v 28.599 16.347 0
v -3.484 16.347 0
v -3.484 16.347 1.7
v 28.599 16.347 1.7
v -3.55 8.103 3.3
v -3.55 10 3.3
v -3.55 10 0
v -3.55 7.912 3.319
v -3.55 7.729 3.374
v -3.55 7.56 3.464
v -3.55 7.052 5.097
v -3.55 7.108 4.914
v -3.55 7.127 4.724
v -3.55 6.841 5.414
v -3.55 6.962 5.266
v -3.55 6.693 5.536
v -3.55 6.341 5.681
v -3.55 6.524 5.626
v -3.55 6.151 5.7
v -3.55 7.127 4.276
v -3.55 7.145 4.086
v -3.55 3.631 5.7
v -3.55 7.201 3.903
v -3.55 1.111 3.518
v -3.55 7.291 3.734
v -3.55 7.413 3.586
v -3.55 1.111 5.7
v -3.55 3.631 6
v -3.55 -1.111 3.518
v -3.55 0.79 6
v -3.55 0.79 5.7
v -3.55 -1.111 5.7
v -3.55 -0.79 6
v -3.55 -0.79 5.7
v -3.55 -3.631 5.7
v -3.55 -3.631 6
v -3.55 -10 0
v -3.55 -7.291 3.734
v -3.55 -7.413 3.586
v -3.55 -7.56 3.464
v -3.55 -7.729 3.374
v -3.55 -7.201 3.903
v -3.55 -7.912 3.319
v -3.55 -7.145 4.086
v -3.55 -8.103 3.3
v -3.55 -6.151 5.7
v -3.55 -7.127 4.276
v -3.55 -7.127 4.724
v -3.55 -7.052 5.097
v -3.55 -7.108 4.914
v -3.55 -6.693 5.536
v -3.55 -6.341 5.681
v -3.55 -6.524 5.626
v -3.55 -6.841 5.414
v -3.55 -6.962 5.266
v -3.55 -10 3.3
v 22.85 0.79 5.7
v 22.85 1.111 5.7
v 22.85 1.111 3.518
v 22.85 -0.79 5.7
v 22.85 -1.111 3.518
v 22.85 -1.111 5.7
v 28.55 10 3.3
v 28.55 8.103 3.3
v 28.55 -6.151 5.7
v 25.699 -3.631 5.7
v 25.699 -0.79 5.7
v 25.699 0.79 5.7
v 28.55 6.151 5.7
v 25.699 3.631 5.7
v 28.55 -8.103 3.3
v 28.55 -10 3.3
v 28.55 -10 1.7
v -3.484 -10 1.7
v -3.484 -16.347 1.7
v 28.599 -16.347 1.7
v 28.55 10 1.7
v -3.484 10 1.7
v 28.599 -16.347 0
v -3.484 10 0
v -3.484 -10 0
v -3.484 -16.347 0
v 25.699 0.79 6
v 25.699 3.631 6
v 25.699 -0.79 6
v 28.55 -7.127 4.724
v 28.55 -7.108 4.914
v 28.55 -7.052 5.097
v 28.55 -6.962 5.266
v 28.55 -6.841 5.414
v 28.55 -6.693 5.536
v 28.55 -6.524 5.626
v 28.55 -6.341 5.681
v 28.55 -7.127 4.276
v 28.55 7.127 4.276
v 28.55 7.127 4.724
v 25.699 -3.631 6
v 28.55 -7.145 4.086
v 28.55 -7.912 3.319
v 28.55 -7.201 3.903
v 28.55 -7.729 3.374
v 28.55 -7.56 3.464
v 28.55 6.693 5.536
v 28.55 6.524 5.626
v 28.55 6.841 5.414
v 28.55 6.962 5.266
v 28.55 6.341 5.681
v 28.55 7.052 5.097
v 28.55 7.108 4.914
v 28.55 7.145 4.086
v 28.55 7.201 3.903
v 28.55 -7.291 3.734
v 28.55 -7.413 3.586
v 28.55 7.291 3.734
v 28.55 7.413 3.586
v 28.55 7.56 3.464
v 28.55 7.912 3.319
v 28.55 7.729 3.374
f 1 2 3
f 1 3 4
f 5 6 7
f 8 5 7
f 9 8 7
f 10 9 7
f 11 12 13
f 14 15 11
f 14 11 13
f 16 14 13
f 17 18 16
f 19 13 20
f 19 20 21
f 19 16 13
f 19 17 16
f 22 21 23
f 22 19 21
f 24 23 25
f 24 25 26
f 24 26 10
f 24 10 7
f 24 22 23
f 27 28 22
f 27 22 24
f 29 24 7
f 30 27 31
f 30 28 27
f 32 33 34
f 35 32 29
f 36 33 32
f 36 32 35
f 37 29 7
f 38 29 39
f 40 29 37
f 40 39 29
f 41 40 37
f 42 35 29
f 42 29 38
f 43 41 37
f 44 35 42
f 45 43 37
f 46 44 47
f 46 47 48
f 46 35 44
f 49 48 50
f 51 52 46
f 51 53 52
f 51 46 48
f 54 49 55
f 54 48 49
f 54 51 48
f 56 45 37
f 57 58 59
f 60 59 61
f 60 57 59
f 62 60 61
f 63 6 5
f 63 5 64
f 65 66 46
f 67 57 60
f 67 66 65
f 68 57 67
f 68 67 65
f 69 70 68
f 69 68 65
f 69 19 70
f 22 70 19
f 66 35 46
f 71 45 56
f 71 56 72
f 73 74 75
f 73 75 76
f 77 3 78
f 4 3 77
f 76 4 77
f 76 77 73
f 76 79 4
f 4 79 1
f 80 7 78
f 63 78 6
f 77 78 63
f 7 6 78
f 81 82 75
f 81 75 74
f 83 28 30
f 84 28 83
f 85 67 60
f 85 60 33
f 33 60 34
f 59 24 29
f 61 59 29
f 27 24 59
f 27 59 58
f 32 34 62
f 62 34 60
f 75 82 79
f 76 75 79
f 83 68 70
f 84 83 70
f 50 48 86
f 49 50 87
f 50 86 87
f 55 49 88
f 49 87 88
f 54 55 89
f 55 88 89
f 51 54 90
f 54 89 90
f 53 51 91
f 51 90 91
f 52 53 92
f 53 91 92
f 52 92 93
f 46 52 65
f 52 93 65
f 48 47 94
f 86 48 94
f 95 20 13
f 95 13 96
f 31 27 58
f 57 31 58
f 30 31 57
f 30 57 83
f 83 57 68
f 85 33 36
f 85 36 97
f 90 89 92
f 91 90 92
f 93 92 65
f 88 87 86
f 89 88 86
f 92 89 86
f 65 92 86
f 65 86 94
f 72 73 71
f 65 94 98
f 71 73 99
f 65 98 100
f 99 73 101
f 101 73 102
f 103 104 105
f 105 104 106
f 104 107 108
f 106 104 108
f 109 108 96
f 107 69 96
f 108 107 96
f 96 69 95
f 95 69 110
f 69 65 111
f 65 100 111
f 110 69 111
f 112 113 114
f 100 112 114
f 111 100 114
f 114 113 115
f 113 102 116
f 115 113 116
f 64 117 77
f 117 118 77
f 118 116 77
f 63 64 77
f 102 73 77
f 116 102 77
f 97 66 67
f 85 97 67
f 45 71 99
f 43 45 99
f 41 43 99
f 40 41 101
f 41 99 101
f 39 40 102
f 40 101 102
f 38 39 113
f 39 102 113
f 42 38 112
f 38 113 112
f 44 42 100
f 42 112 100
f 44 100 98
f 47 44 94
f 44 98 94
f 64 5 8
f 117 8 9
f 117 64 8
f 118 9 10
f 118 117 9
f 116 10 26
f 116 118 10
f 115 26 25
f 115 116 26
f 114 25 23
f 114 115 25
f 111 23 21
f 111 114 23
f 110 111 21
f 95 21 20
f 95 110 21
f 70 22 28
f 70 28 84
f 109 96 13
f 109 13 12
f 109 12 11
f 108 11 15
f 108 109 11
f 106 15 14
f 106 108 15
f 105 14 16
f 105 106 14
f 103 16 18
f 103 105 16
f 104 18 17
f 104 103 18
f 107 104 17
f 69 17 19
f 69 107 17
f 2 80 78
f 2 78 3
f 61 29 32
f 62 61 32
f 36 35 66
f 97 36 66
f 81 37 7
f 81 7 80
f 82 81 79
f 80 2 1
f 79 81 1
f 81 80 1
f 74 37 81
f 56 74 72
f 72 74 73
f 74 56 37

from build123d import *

# Parameters (mm, degrees)
F0_W      = 57.1
F0_H      = 20
F1_DEPTH  = 3.3
F2_W      = 57.1
F2_H      = 14.253388
F3_DEPTH  = 2.4
F4_R      = 0.976
F5_W      = 2.221158
F5_H      = 4.363652
F6_DEPTH  = 51.4
F7_W      = 54.248591
F7_H      = 2.840603
F8_DEPTH  = 0.3
F9_W      = 1.6
F9_H      = 2
F10_DEPTH = 1.25
F12_DEPTH = 1.25
F13_W     = 20.793454
F13_H     = 7.292897
F14_DEPTH = 25
F15_W     = 32.082847
F15_H     = 32.694116
F16_DEPTH = 1.7


with BuildPart() as f1:
    # F0 (on Top) → F1 (new body)
    with BuildSketch(Plane.XY):
        Rectangle(F0_W, F0_H)
    extrude(amount=F1_DEPTH)

    # F2 (on face) → F3 (join)
    with BuildSketch(Plane.XY.offset(3.3)):
        Rectangle(F2_W, F2_H)
    extrude(amount=F3_DEPTH)

    # F4
    f4_edges = [f1.edges().sort_by_distance(p)[0] for p in [
        (0, -7.126694, 3.3),
        (0, 7.126694, 3.3),
        (0, 7.126694, 5.7),
        (0, -7.126694, 5.7),
    ]]
    fillet(f4_edges, radius=F4_R)

    # F5 (on face) → F6 (cut)
    with BuildSketch(Plane(origin=(-28.55, 0, 0), x_dir=(0, -1, 0), z_dir=(-1, 0, 0))):
        with Locations((0, 5.7)):
            Rectangle(F5_W, F5_H)
    extrude(amount=-F6_DEPTH, mode=Mode.SUBTRACT)

    # F7 (on face) → F8 (join)
    with BuildSketch(Plane.XY.offset(5.7)):
        with Locations((-1.425704, 2.210335)):
            Rectangle(F7_W, F7_H)
        Polygon((25.698591, 3.630636), (-28.55, 3.630636), (-28.55, 1.110579), (-28.55, 0.790033), (25.698591, 0.790033), align=None)
        Polygon((25.698591, -0.790033), (-28.55, -0.790033), (-28.55, -1.110579), (-28.55, -3.630636), (25.698591, -3.630636), align=None)
    extrude(amount=F8_DEPTH)

    # F9 (on face) → F10 (cut)
    with BuildSketch(Plane.XY.offset(6)):
        with Locations((-17.431669, -1.790033)):
            Rectangle(F9_W, F9_H)
    extrude(amount=-F10_DEPTH, mode=Mode.SUBTRACT)

    # F11 (on face) → F12 (cut)
    with BuildSketch(Plane.XY.offset(6)):
        with BuildLine():
            Line((-16.631669, -2.790033), (-18.231669, -2.790033))
            ThreePointArc((-18.231669, -2.790033), (-17.431669, -3.396082), (-16.631669, -2.790033))
        make_face()
    extrude(amount=-F12_DEPTH, mode=Mode.SUBTRACT)

    # F13 (on face) → F14 (cut)
    with BuildSketch(Plane(origin=(-28.55, 0, 0), x_dir=(0, -1, 0), z_dir=(-1, 0, 0))):
        with Locations((0, 2.663676)):
            Rectangle(F13_W, F13_H)
    extrude(amount=-F14_DEPTH, mode=Mode.SUBTRACT)

    # F15 (on Top) → F16 (join)
    with BuildSketch(Plane.XY):
        with Locations((12.557171, 0)):
            Rectangle(F15_W, F15_H)
    extrude(amount=F16_DEPTH)


solid = f1.part
